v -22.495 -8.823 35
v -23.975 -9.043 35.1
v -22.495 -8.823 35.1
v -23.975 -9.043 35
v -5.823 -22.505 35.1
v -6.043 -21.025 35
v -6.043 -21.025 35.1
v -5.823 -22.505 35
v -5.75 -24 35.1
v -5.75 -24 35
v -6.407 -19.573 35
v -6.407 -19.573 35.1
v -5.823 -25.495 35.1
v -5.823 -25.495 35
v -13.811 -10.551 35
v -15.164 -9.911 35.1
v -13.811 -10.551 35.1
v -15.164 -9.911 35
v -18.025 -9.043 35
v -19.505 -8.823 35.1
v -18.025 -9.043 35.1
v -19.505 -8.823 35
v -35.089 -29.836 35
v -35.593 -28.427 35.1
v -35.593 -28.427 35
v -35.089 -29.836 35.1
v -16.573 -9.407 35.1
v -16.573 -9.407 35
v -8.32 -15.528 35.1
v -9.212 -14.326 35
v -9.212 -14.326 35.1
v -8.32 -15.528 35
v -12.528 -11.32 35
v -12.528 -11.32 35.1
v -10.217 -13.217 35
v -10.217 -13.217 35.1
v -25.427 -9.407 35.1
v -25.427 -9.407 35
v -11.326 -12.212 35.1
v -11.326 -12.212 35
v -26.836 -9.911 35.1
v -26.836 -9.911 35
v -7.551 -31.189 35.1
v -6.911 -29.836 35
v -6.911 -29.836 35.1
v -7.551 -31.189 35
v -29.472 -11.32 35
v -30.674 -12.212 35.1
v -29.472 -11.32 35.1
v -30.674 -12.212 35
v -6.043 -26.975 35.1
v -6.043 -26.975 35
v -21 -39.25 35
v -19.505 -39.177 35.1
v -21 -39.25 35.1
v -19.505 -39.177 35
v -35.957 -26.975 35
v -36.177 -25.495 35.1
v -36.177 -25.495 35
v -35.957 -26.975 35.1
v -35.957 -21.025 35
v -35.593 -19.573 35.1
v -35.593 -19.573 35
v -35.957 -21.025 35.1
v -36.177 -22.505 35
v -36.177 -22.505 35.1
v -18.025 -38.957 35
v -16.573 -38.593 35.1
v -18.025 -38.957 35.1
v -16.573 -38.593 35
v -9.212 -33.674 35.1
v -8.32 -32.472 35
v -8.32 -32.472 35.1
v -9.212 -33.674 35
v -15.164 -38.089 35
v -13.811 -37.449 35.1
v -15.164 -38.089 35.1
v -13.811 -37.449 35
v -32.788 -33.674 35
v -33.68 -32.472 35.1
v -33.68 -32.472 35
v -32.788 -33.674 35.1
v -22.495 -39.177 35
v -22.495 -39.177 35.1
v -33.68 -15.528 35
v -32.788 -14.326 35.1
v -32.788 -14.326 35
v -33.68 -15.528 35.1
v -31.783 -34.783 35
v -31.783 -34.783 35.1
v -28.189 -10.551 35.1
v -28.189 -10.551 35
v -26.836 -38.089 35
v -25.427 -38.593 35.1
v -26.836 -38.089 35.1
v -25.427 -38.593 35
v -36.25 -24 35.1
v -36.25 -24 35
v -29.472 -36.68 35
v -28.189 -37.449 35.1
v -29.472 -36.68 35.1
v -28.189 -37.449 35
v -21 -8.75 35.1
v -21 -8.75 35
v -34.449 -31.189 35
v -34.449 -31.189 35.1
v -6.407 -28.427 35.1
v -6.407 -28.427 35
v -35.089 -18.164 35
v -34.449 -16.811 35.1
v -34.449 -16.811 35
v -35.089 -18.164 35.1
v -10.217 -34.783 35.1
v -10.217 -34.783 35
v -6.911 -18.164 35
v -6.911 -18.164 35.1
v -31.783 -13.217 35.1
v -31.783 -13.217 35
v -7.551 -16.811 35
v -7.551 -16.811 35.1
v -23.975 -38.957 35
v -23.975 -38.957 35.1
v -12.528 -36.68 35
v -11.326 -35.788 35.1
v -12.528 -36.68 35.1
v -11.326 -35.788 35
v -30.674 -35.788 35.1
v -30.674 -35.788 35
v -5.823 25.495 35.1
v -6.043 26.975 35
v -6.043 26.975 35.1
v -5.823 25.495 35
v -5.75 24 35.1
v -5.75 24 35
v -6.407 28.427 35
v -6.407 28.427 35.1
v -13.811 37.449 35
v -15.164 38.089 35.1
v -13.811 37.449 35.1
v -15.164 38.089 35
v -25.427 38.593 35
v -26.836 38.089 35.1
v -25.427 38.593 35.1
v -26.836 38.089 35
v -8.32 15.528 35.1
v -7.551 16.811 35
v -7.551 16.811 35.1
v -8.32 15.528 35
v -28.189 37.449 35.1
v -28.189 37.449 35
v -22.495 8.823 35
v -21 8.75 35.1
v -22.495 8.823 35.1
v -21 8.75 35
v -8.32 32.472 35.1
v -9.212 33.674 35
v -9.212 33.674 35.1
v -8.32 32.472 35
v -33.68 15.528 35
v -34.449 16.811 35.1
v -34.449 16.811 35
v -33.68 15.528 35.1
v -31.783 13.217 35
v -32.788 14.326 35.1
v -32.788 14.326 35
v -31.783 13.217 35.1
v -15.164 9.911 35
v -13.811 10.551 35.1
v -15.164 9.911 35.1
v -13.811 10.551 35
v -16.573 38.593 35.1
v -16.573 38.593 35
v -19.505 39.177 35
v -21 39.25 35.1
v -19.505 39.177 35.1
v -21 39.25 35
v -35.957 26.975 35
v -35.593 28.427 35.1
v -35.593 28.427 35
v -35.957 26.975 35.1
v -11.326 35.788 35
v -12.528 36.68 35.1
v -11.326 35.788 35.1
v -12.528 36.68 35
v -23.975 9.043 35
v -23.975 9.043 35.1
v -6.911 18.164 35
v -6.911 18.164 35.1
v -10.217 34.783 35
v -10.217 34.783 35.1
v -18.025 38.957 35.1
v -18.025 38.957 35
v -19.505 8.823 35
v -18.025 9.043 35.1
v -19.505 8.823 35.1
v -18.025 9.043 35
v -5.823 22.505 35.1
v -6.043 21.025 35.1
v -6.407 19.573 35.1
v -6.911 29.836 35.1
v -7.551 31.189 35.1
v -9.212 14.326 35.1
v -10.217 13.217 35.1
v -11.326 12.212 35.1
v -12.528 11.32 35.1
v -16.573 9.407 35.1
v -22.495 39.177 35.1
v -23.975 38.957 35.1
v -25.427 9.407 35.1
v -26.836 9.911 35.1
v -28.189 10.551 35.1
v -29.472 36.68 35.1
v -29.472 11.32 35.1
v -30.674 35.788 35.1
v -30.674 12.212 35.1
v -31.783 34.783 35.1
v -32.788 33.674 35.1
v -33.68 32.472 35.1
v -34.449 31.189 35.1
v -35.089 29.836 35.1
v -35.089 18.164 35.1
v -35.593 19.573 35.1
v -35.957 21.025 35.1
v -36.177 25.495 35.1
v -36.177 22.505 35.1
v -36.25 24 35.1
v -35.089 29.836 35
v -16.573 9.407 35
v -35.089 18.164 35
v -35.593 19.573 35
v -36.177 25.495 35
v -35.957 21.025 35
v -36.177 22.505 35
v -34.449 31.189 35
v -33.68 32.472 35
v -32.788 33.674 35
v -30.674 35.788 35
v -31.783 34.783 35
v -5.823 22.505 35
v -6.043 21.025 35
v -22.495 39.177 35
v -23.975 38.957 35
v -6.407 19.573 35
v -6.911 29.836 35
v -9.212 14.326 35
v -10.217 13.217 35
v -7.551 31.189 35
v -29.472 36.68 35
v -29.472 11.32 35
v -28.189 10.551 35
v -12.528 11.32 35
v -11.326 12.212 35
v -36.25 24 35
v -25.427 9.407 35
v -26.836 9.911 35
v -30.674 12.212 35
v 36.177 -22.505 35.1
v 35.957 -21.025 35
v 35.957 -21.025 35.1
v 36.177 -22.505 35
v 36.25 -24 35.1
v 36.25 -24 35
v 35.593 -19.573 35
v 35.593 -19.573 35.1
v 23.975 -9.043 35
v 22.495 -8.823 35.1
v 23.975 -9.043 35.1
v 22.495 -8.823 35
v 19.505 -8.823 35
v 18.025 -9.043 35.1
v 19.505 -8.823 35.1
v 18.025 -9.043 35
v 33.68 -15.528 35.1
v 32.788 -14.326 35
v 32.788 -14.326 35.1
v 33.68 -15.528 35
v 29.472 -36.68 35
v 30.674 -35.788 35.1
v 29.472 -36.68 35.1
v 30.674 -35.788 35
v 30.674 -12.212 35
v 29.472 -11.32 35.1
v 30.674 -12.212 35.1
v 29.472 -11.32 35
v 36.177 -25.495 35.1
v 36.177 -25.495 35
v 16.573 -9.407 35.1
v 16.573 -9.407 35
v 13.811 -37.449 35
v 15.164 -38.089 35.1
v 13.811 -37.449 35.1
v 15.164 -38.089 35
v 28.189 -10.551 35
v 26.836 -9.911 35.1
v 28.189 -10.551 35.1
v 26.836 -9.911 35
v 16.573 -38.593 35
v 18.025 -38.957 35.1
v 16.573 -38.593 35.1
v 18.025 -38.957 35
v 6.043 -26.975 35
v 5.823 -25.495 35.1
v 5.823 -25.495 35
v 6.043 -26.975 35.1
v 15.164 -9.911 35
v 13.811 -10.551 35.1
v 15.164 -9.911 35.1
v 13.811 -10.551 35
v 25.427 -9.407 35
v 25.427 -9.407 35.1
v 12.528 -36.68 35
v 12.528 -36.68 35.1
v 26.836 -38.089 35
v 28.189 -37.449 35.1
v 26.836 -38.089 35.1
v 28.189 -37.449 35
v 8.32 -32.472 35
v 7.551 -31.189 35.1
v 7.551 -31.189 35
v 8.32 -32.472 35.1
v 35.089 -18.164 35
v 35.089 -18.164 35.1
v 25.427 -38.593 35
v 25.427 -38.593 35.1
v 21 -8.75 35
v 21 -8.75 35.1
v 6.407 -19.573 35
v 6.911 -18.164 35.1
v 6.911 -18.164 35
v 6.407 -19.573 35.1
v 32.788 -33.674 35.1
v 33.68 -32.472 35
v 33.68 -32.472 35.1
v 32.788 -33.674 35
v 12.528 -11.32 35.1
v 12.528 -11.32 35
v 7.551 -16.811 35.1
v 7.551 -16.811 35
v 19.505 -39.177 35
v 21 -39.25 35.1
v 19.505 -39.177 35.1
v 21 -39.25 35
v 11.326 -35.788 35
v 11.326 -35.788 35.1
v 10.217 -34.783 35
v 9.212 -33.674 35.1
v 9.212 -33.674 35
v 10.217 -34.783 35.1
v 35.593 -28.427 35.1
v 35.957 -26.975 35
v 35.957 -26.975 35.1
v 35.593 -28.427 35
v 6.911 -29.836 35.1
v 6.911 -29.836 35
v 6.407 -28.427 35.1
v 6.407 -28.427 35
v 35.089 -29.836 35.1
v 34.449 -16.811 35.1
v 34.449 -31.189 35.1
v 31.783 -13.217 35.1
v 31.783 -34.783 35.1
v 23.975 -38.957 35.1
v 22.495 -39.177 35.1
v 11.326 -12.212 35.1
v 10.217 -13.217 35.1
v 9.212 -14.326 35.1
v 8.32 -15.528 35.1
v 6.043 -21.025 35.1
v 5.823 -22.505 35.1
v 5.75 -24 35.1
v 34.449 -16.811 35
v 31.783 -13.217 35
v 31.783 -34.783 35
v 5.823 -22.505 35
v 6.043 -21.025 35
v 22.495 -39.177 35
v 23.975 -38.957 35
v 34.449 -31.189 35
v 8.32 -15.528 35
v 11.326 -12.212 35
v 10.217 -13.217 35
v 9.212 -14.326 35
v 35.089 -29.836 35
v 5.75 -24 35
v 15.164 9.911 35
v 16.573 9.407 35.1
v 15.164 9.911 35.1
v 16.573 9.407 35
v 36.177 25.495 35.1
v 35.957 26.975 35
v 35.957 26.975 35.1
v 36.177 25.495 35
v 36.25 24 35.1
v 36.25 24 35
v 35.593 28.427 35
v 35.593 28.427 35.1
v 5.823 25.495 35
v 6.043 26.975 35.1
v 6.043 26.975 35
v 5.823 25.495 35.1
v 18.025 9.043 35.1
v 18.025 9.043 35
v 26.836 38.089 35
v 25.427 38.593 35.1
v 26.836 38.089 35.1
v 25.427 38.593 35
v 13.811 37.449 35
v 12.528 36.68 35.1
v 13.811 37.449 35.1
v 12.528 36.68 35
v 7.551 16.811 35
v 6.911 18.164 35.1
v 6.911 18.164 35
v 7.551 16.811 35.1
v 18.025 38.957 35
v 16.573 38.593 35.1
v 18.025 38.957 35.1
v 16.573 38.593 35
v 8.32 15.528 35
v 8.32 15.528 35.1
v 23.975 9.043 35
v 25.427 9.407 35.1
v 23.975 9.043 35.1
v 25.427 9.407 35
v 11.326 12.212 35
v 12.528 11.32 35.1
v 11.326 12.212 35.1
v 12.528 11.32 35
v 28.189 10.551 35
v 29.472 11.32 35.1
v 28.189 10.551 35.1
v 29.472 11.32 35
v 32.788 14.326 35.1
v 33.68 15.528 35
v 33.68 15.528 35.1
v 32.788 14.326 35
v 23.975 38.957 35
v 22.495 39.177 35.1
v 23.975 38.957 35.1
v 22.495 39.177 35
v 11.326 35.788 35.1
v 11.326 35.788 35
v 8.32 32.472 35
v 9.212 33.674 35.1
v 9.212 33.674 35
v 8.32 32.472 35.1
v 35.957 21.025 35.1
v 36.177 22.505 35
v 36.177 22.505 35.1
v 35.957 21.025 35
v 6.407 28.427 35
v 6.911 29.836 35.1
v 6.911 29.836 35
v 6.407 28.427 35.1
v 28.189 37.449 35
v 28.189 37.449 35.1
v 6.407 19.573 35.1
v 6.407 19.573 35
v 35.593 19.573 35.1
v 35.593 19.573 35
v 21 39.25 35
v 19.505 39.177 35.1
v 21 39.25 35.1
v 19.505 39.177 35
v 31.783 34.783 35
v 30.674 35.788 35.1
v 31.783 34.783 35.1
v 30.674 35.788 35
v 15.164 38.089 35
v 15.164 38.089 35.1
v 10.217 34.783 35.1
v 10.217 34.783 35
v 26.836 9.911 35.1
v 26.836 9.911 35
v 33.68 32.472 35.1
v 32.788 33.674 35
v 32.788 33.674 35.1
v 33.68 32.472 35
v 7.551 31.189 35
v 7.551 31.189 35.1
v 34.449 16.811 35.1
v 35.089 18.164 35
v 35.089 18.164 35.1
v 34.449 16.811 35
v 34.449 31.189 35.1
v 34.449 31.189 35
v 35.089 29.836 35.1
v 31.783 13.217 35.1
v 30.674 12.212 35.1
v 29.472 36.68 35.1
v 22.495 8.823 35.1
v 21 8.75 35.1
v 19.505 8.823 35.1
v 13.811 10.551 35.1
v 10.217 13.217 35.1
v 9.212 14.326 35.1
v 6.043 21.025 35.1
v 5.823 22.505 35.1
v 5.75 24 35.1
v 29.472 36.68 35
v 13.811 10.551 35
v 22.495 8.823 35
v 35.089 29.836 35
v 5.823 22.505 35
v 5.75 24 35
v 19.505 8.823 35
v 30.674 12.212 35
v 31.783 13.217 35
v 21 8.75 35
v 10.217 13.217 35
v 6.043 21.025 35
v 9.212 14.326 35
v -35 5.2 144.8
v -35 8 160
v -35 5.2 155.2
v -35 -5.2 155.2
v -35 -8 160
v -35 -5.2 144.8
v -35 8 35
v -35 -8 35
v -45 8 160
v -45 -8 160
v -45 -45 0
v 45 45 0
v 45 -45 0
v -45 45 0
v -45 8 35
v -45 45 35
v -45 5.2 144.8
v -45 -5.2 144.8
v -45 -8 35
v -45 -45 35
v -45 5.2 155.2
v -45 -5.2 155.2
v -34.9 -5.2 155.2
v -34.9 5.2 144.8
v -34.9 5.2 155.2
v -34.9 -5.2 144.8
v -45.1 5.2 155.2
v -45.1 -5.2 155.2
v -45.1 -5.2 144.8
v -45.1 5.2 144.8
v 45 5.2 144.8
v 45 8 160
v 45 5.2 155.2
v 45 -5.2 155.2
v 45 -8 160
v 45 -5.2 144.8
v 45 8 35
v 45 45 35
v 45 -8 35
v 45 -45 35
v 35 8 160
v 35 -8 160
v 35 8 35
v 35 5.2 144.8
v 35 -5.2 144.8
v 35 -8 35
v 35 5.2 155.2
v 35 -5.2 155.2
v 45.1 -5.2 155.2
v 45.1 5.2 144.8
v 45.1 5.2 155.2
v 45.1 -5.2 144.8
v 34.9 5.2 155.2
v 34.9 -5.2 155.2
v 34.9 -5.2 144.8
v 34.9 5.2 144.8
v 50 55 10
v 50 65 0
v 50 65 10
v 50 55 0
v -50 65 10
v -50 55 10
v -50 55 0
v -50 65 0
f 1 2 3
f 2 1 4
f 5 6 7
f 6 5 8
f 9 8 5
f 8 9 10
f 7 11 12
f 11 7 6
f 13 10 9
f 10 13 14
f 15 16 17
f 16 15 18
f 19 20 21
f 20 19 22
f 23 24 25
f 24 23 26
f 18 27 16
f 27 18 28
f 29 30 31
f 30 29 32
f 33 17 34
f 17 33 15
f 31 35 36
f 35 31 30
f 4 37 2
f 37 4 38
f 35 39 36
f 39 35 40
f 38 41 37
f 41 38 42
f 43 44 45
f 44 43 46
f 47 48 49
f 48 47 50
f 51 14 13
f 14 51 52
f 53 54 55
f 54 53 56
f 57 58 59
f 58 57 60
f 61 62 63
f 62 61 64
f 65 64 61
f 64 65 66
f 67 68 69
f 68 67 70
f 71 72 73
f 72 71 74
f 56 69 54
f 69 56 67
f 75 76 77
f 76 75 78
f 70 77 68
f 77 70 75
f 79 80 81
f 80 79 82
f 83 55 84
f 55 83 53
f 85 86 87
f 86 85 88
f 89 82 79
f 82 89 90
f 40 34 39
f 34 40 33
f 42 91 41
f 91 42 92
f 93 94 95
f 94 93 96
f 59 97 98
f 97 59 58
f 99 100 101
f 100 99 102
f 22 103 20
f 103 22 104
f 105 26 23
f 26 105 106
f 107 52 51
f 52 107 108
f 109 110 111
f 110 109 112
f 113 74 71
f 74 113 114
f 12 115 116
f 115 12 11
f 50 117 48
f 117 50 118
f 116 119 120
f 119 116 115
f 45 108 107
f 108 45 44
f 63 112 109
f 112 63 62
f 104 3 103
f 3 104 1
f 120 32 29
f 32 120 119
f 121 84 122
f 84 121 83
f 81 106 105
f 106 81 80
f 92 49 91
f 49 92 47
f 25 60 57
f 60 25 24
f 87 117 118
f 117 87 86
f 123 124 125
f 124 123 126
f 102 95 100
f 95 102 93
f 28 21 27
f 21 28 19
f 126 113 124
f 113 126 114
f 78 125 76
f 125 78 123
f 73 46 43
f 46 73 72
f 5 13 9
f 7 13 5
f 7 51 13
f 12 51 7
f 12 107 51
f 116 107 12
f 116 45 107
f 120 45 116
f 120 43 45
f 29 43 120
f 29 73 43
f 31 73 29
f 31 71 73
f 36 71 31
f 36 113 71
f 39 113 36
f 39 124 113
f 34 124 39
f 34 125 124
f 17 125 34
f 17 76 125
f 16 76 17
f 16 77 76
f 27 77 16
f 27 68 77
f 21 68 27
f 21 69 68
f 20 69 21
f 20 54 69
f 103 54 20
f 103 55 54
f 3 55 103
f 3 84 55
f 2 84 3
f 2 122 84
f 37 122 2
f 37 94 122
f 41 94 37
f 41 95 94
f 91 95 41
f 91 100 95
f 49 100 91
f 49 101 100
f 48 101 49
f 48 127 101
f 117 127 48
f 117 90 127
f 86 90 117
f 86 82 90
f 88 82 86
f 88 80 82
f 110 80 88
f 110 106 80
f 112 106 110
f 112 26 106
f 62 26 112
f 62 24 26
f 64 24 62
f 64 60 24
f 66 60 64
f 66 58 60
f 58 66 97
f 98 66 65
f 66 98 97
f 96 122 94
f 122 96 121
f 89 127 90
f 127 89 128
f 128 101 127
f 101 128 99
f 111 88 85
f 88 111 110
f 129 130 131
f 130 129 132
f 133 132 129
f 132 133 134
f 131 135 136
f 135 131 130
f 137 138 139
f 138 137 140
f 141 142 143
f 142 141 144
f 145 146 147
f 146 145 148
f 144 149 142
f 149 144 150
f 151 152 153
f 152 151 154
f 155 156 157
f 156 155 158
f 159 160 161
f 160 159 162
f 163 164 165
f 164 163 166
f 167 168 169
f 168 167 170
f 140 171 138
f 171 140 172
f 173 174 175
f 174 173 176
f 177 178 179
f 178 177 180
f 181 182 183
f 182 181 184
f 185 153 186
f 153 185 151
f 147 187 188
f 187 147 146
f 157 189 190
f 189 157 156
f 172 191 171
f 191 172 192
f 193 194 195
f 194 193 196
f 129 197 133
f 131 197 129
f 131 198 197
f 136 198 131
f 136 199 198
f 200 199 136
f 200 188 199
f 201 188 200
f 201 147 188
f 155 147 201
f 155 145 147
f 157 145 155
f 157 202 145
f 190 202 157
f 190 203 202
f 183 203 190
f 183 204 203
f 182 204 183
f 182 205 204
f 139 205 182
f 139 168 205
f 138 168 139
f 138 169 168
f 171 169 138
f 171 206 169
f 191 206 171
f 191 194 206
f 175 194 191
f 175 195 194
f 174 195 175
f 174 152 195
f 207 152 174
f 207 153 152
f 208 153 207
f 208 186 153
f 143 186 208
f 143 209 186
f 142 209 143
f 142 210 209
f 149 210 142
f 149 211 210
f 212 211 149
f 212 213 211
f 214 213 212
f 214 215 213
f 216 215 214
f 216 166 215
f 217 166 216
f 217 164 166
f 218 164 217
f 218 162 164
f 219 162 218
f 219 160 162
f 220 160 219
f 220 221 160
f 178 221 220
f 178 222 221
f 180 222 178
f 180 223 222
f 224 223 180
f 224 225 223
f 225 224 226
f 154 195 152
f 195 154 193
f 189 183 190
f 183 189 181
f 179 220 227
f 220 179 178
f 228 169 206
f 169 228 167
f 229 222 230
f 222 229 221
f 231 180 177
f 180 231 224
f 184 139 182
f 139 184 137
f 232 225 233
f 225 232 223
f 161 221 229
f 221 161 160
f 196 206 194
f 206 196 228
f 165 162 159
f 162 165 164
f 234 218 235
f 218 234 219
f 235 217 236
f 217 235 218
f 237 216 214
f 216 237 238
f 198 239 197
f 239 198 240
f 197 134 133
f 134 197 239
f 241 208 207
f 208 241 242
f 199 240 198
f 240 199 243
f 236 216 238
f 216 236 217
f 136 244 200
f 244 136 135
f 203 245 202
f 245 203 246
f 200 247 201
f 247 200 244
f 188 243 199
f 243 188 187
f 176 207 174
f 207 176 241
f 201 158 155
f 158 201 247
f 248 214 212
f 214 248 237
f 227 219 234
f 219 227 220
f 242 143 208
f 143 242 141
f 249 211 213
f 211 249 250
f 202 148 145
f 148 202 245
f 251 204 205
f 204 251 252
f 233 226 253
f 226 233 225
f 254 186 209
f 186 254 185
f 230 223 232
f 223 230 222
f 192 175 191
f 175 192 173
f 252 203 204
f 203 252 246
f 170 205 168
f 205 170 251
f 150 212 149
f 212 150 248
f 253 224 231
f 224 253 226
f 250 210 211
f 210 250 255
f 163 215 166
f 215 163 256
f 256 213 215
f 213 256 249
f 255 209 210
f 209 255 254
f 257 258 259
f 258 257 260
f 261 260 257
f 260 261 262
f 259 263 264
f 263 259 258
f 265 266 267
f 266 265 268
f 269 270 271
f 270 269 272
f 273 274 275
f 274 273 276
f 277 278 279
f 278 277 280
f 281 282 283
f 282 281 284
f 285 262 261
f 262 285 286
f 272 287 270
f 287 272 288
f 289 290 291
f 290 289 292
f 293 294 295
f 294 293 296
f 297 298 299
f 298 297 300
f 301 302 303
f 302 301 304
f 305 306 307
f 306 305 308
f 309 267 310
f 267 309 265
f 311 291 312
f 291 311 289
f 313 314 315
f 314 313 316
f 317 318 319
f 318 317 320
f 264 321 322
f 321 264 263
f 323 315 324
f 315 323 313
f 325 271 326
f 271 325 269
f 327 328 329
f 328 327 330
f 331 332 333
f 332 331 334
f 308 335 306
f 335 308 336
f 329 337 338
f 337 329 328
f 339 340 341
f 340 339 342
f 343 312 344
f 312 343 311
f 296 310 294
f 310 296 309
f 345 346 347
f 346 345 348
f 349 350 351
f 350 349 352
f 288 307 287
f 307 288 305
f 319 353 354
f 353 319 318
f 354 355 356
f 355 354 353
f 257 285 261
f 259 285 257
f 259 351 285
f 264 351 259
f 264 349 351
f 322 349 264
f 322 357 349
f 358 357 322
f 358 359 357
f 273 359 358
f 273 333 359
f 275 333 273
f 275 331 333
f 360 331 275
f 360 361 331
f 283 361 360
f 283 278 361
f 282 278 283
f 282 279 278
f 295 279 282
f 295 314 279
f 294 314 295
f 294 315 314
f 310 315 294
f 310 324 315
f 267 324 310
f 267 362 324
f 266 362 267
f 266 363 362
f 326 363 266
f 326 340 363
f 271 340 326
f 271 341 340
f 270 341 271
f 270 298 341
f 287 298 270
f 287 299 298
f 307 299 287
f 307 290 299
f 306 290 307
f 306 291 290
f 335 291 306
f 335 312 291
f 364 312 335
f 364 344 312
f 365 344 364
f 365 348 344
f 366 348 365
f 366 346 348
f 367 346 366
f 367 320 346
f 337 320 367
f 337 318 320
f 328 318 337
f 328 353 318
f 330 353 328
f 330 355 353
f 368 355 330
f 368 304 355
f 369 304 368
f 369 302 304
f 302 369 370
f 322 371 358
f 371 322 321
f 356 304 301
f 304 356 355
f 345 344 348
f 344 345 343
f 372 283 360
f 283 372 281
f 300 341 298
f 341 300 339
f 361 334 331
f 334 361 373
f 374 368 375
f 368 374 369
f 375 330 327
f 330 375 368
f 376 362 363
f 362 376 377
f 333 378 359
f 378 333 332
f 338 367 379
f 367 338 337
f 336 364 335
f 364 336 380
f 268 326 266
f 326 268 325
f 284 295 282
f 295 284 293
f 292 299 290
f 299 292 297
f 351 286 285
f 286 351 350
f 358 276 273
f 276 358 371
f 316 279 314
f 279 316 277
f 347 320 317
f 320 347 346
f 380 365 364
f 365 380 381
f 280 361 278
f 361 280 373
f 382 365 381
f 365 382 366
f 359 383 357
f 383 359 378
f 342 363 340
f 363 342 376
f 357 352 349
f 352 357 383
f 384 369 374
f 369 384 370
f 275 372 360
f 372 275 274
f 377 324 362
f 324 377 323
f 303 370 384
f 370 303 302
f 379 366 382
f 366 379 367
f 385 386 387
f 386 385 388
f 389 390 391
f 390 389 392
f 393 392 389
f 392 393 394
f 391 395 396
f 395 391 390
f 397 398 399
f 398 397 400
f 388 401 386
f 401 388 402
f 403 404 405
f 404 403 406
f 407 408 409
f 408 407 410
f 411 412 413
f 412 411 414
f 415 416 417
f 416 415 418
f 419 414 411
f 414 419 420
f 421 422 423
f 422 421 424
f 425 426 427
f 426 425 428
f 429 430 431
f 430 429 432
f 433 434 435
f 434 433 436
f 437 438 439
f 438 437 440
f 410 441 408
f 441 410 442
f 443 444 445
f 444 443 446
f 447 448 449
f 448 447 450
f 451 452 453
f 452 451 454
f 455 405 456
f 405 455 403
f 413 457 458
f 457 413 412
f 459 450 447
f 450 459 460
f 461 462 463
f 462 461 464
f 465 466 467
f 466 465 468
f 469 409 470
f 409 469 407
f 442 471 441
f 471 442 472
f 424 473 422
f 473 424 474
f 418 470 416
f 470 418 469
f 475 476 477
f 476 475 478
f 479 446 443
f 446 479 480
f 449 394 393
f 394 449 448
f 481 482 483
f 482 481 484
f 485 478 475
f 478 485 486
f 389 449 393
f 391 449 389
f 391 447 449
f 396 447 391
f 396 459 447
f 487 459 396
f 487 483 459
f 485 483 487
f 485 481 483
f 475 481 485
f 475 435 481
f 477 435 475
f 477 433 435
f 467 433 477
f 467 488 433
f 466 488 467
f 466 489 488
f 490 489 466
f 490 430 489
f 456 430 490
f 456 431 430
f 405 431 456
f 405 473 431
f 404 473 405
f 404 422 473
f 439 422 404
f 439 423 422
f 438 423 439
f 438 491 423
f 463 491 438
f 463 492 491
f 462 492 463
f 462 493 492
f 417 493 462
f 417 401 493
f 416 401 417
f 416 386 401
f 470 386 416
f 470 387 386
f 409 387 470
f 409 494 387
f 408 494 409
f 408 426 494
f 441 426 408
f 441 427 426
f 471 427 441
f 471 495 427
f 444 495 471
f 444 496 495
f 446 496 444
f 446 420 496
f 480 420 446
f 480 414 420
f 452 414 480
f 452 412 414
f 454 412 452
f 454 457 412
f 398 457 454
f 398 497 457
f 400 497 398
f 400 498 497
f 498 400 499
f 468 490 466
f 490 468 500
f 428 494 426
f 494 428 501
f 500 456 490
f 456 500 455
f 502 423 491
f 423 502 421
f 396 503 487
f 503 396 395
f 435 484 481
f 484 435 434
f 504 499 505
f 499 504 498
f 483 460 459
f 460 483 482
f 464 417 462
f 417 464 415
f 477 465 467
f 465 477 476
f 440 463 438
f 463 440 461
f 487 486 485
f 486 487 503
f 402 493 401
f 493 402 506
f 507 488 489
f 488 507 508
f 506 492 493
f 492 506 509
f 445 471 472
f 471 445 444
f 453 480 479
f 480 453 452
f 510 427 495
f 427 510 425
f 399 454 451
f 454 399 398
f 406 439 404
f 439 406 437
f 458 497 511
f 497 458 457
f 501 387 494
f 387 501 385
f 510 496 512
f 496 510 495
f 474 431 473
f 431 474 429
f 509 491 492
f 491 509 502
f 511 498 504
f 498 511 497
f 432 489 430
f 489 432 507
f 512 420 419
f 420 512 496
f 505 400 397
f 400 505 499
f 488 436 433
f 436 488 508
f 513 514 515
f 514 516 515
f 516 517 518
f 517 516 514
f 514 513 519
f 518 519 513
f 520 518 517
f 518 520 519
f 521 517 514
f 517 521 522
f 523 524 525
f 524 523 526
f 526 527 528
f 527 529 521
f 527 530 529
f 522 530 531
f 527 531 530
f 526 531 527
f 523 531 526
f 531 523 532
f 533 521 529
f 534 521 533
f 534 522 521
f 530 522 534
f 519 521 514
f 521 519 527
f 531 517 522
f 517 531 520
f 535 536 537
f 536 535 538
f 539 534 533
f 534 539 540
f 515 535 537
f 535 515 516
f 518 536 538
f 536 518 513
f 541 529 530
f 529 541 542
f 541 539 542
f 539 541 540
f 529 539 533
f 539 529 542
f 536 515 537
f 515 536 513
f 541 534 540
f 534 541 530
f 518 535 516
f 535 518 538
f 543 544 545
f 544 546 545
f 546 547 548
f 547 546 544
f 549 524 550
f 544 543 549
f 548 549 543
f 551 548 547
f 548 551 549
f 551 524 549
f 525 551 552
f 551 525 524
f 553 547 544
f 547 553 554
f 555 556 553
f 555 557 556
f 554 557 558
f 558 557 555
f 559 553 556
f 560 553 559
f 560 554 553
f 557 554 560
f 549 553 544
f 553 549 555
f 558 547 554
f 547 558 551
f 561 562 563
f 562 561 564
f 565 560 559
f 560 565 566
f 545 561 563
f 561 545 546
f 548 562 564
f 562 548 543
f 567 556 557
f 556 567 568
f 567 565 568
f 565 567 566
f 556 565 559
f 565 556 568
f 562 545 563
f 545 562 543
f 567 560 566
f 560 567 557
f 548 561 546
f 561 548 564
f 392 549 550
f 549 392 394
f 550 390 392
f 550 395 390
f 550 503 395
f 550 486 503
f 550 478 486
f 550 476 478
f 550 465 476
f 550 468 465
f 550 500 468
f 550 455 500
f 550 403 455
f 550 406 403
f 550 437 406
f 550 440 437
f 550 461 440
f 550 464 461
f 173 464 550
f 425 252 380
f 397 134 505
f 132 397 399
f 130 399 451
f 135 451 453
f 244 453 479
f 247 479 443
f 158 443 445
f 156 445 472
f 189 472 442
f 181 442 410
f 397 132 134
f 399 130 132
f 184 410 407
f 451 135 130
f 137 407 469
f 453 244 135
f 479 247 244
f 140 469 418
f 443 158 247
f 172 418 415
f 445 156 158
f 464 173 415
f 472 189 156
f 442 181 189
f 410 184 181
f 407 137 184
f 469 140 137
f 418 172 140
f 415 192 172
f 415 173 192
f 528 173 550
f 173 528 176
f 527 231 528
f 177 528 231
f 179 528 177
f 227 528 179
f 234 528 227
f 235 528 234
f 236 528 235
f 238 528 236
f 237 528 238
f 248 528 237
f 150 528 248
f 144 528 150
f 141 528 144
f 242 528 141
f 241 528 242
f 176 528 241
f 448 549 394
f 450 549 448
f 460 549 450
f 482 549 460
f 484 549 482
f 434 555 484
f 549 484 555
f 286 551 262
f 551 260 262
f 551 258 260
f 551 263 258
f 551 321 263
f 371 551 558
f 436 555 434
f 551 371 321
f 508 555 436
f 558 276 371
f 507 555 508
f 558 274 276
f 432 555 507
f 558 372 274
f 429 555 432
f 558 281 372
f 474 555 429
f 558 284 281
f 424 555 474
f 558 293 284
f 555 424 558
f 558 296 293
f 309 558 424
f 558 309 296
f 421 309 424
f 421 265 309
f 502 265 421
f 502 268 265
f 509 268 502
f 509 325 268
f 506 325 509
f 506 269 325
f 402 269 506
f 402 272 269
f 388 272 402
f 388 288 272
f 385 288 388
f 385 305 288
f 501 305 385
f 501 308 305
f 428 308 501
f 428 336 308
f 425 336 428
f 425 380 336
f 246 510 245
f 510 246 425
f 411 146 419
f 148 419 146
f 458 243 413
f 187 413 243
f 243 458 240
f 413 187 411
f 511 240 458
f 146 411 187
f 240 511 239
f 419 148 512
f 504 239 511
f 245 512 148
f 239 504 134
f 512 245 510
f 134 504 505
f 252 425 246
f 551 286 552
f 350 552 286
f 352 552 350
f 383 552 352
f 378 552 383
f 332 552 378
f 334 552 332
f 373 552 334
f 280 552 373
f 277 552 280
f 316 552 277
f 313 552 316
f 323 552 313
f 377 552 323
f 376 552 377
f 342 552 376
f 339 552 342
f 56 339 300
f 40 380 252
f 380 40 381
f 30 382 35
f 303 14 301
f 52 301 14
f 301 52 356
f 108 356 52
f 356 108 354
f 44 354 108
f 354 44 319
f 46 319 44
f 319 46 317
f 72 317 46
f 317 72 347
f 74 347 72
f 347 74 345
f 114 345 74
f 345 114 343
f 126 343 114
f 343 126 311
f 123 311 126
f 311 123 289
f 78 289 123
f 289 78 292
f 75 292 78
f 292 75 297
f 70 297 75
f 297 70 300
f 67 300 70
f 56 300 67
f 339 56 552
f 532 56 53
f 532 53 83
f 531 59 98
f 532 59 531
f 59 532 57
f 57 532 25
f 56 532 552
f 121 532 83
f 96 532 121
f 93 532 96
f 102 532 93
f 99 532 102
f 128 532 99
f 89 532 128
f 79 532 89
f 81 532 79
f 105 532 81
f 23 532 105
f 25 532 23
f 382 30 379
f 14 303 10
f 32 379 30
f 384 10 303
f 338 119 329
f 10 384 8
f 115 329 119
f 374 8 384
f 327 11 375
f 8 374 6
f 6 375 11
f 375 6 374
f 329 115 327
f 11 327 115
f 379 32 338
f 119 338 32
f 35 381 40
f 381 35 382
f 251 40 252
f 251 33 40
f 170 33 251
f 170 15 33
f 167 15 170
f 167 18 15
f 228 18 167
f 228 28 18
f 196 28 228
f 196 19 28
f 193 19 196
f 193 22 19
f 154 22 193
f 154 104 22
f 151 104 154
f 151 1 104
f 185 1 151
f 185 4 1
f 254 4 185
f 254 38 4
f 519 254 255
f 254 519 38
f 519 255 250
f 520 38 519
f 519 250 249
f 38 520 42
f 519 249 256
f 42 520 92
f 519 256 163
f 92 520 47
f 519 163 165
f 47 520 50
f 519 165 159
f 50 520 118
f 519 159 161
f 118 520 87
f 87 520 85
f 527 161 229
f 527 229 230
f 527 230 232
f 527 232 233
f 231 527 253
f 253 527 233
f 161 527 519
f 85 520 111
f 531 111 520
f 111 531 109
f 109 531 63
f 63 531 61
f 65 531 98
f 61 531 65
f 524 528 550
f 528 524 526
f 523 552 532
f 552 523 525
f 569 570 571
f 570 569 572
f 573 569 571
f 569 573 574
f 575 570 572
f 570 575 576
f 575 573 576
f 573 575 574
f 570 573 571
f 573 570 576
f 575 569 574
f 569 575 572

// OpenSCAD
// Carrier for four 50 mL conical tubes, printed as two parts side by side.
// Units: millimetres. Print orientation: parts rest on the XY plane (z = 0),
// building upward (+Z). Part 1 is centred on the origin; Part 2 (handle) is
// offset in +Y so the two parts print side by side.

$fn = 64;

// ---------------- Part 1: base block + two posts ----------------
base_w   = 90;   // base block width  (X)
base_d   = 90;   // base block depth   (Y)
base_h   = 35;   // base block height  (Z)

seat_d   = 30.5; // blind seat diameter
seat_dep = 30;   // blind seat depth (leaves a 5 mm floor)
seat_x   = 21;   // seat centre |x|
seat_y   = 24;   // seat centre |y|

post_t   = 10;   // post thickness (X)
post_w   = 16;   // post width     (Y)
post_h   = 160;  // post height (top at z = 160)
post_x   = 40;   // post centre |x| (10 mm thick, flush with 90 mm end faces)
post_hole = 10.4;// square through-hole side (X)
post_hole_z = 150; // hole centre height

// ---------------- Part 2: handle bar ----------------
bar_t    = 10;   // bar thickness (X)
bar_w    = 10;   // bar width     (Y)
bar_len  = 100;  // bar length    (Z)
bar_y    = 60;   // bar centre Y (spans y = 55..65, 10 mm gap to base +Y face)

// ================= PART 1 =================
part1() ;

module part1() {
    union() {
        // Base block, centred on the origin
        translate([-base_w/2, -base_d/2, 0])
            cube([base_w, base_d, base_h]);

        // Four blind tube seats (30.5 mm dia, 30 mm deep, 5 mm floor)
        for (sx = [-seat_x, seat_x])
            for (sy = [-seat_y, seat_y])
                translate([sx, sy, base_h - seat_dep])
                    cylinder(h = seat_dep + 0.1, d = seat_d);

        // Two posts, flush with the X end faces, centred on y = 0
        for (px = [-post_x, post_x]) {
            translate([px - post_t/2, -post_w/2, 0])
                cube([post_t, post_w, post_h]);

            // 10.4 x 10.4 mm square through-hole along X, centred at z = 150
            translate([px - post_t/2 - 0.1, -post_hole/2, post_hole_z - post_hole/2])
                cube([post_t + 0.2, post_hole, post_hole]);
        }
    }
}

// ================= PART 2 (handle) =================
// Printed side by side with part 1 (offset in +Y). After printing, the bar is
// pushed through both posts (it spans y = 55..65, i.e. 10 mm clear of the base).
translate([0, bar_y, 0])
    part2();

module part2() {
    // Square bar 10 x 10 mm, 100 mm long, lying on the bed along X, centred on x = 0
    translate([-bar_len/2, -bar_w/2, 0])
        cube([bar_len, bar_w, bar_t]);
}
